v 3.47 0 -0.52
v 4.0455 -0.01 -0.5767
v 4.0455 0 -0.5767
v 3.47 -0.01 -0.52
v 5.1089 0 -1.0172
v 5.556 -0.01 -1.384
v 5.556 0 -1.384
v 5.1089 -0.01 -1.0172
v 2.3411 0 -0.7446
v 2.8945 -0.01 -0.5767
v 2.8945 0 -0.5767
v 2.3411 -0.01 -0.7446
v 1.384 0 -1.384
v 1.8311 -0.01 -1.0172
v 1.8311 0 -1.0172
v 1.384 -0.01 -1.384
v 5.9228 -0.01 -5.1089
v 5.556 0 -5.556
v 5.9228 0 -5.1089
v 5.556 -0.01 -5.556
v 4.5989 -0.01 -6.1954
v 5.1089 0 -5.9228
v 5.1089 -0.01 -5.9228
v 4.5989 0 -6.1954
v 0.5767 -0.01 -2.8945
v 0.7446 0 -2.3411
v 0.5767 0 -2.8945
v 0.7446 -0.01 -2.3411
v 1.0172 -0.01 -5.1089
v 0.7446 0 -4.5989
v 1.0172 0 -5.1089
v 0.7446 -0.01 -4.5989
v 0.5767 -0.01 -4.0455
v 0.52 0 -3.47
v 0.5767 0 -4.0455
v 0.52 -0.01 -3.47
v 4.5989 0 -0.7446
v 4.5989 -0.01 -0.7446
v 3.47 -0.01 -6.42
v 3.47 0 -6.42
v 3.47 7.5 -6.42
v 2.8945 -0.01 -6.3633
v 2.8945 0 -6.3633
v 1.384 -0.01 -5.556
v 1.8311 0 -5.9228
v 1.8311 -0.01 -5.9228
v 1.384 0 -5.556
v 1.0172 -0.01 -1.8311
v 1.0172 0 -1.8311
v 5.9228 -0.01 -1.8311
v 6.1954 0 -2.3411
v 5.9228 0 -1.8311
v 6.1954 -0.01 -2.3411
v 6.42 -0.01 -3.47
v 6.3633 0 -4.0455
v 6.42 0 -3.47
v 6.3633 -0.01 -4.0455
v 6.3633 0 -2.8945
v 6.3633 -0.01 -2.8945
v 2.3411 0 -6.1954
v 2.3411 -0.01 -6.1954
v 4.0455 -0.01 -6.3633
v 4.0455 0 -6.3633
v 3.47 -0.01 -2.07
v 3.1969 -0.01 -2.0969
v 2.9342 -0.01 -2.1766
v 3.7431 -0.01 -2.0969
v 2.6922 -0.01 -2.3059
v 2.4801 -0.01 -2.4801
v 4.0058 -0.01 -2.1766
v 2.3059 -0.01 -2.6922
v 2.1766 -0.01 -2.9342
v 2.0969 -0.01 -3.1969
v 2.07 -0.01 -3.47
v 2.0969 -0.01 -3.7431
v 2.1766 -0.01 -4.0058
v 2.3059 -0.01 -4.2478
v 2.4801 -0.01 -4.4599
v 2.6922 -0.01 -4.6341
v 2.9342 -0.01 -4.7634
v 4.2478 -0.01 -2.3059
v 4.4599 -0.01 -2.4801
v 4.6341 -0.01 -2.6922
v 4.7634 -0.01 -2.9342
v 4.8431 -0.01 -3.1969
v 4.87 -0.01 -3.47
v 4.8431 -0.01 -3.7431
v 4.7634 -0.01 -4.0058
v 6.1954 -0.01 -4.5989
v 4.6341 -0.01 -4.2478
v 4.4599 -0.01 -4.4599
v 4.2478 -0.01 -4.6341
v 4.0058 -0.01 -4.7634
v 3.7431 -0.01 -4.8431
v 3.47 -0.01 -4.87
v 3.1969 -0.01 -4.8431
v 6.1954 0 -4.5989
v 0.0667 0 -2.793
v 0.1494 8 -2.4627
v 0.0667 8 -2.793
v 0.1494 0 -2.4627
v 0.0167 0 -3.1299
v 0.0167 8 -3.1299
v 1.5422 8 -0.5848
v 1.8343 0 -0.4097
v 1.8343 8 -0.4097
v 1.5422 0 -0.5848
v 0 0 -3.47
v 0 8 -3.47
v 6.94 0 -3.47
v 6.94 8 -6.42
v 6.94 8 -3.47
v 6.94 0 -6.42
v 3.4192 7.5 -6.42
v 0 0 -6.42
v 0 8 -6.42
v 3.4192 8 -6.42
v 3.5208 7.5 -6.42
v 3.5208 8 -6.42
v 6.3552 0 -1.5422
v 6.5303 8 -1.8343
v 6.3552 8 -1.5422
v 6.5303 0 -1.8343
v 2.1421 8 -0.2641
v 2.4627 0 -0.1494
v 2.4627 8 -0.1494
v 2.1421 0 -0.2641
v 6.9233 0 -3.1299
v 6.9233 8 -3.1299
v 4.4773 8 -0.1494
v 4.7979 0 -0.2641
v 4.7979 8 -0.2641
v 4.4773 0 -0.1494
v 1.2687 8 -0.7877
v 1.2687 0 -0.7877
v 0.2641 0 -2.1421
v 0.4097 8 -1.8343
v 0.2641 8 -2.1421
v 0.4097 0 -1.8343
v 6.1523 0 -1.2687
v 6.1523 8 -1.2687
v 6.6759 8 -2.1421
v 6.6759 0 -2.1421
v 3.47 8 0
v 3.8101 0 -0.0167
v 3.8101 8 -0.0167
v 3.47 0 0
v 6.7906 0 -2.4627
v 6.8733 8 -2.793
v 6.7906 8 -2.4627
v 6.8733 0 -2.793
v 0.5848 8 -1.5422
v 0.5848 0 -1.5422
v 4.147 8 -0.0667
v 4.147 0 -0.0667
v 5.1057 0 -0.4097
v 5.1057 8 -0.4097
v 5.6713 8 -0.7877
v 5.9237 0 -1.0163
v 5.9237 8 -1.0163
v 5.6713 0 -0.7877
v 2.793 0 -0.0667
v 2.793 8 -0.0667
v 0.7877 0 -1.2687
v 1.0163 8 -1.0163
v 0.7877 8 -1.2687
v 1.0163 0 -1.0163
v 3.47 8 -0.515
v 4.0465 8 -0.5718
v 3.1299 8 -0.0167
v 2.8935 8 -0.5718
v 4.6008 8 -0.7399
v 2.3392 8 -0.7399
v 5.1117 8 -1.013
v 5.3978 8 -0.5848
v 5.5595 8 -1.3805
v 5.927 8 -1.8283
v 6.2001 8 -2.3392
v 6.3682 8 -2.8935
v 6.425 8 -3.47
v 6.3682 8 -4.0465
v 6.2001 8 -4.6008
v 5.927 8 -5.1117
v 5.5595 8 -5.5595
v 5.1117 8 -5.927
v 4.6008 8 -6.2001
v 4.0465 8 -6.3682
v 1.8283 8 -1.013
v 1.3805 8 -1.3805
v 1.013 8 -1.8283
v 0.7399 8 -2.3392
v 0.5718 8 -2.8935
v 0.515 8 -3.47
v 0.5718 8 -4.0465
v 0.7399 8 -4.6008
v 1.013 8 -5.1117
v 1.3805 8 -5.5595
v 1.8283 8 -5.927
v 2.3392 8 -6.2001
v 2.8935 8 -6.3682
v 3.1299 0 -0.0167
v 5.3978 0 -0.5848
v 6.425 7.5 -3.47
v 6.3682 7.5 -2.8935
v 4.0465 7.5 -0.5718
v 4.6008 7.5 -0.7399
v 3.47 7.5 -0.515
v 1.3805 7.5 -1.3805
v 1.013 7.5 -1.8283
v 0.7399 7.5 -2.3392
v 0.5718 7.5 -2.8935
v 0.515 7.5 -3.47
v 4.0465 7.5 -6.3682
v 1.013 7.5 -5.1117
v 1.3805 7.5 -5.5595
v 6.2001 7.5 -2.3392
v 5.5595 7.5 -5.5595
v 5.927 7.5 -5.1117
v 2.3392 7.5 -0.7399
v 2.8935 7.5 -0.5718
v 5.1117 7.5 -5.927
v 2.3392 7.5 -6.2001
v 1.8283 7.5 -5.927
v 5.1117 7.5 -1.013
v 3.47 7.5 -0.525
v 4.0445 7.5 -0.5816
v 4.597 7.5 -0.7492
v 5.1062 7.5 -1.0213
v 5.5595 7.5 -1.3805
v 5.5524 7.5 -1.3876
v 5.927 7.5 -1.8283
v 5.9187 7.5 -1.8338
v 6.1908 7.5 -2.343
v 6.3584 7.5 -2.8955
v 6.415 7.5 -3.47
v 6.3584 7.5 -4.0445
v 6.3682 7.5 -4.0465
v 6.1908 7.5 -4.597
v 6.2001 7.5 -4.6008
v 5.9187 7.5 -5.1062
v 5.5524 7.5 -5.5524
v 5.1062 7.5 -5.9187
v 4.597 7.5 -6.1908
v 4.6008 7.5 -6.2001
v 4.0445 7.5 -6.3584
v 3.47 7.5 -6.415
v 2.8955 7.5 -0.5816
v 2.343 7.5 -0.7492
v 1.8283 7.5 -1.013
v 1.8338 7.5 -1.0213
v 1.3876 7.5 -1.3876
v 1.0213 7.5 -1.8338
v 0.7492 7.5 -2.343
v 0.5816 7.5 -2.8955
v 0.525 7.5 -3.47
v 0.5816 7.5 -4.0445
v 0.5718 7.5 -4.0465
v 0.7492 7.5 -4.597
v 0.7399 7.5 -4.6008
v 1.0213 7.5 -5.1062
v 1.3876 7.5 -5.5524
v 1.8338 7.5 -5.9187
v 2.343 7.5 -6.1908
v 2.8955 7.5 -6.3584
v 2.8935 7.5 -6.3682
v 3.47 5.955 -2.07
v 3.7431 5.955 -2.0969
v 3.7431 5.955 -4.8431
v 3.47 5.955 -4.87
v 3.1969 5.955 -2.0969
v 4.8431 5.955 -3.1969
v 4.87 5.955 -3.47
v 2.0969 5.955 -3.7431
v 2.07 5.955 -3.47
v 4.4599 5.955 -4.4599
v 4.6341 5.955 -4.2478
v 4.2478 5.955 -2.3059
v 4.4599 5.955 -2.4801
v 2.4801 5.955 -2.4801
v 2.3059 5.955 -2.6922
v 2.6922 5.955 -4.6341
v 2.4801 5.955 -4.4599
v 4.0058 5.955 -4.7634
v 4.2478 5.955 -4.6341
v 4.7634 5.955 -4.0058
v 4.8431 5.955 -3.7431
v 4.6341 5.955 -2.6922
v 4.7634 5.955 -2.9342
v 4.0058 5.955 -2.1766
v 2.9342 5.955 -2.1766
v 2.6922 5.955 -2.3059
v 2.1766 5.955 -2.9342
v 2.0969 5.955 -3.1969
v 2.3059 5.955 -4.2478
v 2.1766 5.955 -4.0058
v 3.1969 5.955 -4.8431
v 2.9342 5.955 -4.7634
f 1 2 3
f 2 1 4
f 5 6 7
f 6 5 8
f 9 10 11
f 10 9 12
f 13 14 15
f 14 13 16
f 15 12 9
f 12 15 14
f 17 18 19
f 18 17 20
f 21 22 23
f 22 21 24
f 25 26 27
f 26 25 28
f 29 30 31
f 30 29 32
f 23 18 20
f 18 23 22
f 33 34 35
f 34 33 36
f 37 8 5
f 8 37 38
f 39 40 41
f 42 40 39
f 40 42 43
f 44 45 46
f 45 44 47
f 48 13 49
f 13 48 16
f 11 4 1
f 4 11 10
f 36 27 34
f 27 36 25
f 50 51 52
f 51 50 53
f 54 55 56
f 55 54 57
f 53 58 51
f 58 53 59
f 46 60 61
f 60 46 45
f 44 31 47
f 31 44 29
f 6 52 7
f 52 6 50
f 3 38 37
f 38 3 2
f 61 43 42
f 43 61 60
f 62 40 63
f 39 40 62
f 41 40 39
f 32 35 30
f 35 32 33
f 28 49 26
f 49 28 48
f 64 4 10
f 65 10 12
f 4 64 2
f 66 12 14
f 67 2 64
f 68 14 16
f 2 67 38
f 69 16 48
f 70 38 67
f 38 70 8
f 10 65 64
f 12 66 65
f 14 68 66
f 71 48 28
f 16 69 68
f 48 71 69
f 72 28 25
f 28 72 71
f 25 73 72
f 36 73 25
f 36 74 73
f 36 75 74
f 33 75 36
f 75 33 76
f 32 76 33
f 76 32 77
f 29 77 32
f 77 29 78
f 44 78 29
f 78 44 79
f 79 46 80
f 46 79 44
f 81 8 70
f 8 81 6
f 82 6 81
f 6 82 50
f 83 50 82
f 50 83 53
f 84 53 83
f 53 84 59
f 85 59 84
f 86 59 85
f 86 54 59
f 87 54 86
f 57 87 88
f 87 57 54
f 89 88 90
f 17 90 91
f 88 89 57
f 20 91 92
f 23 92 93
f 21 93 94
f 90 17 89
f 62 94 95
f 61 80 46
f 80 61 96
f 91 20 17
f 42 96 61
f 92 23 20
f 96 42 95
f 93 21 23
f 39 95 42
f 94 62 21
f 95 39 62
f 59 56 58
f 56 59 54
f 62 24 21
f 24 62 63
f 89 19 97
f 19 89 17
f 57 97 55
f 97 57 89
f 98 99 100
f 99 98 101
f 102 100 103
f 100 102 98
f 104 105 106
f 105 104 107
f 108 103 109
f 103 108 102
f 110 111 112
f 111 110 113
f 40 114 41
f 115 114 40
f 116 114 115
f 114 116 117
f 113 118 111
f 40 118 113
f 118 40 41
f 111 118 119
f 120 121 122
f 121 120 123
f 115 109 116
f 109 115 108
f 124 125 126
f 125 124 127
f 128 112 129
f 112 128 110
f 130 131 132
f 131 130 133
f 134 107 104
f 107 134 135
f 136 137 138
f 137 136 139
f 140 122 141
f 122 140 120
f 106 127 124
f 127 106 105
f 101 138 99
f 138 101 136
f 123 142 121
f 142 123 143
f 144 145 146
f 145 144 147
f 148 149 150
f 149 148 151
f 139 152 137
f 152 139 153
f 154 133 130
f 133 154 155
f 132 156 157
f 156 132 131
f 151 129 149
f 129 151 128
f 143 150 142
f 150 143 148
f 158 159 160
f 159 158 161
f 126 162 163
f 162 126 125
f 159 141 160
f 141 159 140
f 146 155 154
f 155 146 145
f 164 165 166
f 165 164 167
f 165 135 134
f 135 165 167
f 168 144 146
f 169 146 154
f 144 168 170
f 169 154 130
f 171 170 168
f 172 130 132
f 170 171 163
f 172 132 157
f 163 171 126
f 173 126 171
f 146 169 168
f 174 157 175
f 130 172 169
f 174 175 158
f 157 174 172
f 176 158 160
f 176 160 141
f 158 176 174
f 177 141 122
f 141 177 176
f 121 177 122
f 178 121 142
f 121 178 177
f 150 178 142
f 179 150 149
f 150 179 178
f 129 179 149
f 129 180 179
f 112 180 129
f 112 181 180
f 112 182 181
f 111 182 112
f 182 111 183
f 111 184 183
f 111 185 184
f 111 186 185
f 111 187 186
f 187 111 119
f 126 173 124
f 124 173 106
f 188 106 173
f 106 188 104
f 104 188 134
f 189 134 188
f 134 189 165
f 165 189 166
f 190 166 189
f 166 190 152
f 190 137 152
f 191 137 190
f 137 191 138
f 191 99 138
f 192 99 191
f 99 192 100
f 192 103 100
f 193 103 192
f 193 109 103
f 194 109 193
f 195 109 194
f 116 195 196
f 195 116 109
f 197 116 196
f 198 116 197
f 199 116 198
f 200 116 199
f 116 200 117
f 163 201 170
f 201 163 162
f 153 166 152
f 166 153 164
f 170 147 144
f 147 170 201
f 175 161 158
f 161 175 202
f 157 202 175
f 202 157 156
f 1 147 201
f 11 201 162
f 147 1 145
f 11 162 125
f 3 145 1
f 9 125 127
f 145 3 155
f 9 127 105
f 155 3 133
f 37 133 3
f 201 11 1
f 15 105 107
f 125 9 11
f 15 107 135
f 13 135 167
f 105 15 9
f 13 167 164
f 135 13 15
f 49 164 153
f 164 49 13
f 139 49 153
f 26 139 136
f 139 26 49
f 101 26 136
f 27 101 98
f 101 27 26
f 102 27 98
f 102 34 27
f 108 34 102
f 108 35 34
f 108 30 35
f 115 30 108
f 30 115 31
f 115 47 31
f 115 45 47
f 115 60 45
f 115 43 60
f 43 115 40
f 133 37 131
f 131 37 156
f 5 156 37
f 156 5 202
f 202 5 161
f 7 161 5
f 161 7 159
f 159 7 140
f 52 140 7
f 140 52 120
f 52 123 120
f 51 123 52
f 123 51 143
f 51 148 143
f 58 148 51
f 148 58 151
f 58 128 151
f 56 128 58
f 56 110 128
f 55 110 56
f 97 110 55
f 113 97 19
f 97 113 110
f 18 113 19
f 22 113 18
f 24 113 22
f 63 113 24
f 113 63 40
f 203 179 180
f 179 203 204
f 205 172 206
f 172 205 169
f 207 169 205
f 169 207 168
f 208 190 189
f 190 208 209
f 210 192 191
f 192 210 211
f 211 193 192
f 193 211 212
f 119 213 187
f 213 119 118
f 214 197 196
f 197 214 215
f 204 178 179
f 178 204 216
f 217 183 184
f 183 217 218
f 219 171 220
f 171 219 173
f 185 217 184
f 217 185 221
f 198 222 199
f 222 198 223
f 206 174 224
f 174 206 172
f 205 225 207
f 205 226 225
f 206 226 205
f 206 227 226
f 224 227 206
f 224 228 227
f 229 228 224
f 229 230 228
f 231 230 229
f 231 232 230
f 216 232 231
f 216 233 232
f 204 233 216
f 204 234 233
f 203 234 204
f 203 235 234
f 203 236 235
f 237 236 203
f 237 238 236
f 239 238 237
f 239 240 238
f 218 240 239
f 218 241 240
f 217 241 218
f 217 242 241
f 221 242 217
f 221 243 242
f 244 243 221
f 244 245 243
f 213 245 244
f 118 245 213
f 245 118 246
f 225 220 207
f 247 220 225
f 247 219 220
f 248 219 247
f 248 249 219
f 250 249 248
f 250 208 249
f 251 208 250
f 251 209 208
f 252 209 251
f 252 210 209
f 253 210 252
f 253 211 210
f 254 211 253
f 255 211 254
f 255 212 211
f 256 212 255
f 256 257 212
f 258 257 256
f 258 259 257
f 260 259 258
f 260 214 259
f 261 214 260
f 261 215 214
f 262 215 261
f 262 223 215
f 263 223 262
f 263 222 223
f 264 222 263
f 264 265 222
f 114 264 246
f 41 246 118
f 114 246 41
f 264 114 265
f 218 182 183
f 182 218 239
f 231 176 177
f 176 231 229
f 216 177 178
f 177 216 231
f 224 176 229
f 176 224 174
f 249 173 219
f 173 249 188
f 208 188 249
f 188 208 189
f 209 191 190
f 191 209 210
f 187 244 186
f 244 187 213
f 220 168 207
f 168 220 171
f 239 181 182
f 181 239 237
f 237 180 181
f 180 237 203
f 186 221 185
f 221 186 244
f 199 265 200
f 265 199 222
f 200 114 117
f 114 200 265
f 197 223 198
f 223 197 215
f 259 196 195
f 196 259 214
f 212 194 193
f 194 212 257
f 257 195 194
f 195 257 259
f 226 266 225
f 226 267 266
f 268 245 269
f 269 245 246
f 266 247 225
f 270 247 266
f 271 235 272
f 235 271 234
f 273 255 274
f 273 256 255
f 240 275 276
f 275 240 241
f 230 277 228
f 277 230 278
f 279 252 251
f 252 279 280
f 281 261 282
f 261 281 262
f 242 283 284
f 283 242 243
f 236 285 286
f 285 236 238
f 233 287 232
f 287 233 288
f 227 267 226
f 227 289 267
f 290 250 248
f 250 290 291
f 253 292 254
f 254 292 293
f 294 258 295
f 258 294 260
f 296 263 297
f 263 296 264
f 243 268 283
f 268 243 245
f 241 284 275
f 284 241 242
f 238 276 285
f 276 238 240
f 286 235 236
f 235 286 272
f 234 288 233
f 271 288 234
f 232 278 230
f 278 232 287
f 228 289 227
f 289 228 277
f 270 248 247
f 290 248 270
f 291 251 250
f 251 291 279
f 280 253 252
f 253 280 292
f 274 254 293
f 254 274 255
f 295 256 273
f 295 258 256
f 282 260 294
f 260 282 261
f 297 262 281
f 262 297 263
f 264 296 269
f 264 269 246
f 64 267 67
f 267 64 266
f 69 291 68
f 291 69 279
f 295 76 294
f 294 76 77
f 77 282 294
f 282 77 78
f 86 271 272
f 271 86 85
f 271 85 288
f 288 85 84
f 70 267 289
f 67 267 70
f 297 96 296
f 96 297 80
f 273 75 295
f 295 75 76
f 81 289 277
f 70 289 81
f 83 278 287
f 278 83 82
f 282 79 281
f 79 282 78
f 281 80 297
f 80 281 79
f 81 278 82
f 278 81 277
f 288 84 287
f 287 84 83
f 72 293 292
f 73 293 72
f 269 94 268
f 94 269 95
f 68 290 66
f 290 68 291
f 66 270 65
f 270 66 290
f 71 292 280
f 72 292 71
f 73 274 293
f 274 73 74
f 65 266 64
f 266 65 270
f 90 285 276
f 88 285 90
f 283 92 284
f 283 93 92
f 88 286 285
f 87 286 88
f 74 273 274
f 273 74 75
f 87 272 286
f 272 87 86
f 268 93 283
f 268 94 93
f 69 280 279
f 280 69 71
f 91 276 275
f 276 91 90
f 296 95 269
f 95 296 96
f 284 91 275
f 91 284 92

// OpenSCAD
// Start: lazy_union
default_5_default_5();
// End: lazy_union

// Modules.

// 'PartMaterial undef-default - default 5.0'
module default_5_default_5() {
  // 'None : _combine_solids_and_holes'
  union() {
    // '_combine_solids_and_holes'
    difference() {
      // 'default : _combine_solids_and_holes'
      union() {
        // 'tab : _combine_solids_and_holes'
        union() {
          // 'box_cylinder'
          multmatrix(m=[[-1.0, 0.0, 0.0, 3.4699999999999998], [0.0, 0.0, 1.0, 0.0], [0.0, 1.0, 0.0, -6.42], [0.0, 0.0, 0.0, 1.0]]) {
            // 'box_cylinder : _combine_solids_and_holes'
            union() {
              // 'box_cylinder'
              linear_extrude(height=8.0, twist=0.0, slices=4, scale=[1.0, 1.0], $fn=32) {
                polygon(points=[[0.0, 0.0], [-3.4699999999999998, 0.0], [-3.4699999999999998, 2.95], [-3.4532910015525227, 3.290119476943576], [-3.4033249229992095, 3.6269634173959657], [-3.3205829649907646, 3.957287830072984], [-3.205861977814165, 4.277911510306861], [-3.0602667872887914, 4.585746676786212], [-2.8851995546898324, 4.877828708578019], [-2.6823462731686973, 5.1513446960478495], [-2.4536605307173196, 5.403660530717319], [-2.2013446960478493, 5.6323462731686975], [-1.9278287085780186, 5.835199554689832], [-1.6357466767862119, 6.010266787288792], [-1.3279115103068613, 6.1558619778141646], [-1.0072878300729837, 6.270582964990764], [-0.6769634173959648, 6.353324922999209], [-0.3401194769435754, 6.403291001552523], [2.1247621965206577e-16, 6.42], [0.34011947694357586, 6.403291001552523], [0.6769634173959652, 6.353324922999209], [1.0072878300729842, 6.270582964990764], [1.3279115103068617, 6.1558619778141646], [1.6357466767862123, 6.010266787288791], [1.927828708578019, 5.835199554689832], [2.2013446960478498, 5.632346273168697], [2.45366053071732, 5.403660530717319], [2.6823462731686973, 5.151344696047849], [2.8851995546898324, 4.8778287085780185], [3.0602667872887914, 4.585746676786211], [3.205861977814165, 4.277911510306861], [3.3205829649907646, 3.9572878300729837], [3.4033249229992095, 3.6269634173959657], [3.453291001552523, 3.2901194769435755], [3.4699999999999998, 2.9499999999999997], [3.4699999999999998, 0.0]]);
              }
            }
          }
        }
        // 'screw'
        multmatrix(m=[[-6.123233995736766e-17, 1.0, 0.0, 3.4699999999999998], [0.0, 0.0, 1.0, 8.0], [1.0, 6.123233995736766e-17, 0.0, -3.4699999999999998], [0.0, 0.0, 0.0, 1.0]]) {
          // 'thru'
          multmatrix(m=[[1.0, 0.0, 0.0, 0.0], [0.0, -1.0, 0.0, 0.0], [0.0, 0.0, -1.0, -4.0], [0.0, 0.0, 0.0, 1.0]]) {
            // 'outer'
            multmatrix(m=[[1.0, 0.0, 0.0, 0.0], [-0.0, -1.0, -0.0, -0.0], [-0.0, -0.0, -1.0, 4.01], [0.0, 0.0, 0.0, 1.0]]) {
              // 'outer : _combine_solids_and_holes'
              union() {
                // 'pie : _combine_solids_and_holes'
                union() {
                  // 'pie'
                  polyhedron(points=[[0.0, 0.0, 0.0], [0.0, 0.0, 8.02], [2.95, 0.0, 8.02], [2.95, 0.0, 0.0], [0.0, 0.0, 0.0], [0.0, 0.0, 8.02], [2.89331657718953, 0.5755164499475783, 8.02], [2.89331657718953, 0.5755164499475783, 0.0], [0.0, 0.0, 0.0], [0.0, 0.0, 8.02], [2.725444620908296, 1.128916125477015, 8.02], [2.725444620908296, 1.128916125477015, 0.0], [0.0, 0.0, 0.0], [0.0, 0.0, 8.02], [2.4528353562925087, 1.6389321874078264, 8.02], [2.4528353562925087, 1.6389321874078264, 0.0], [0.0, 0.0, 0.0], [0.0, 0.0, 8.02], [2.0859650045003155, 2.0859650045003155, 8.02], [2.0859650045003155, 2.0859650045003155, 0.0], [0.0, 0.0, 0.0], [0.0, 0.0, 8.02], [1.6389321874078269, 2.4528353562925087, 8.02], [1.6389321874078269, 2.4528353562925087, 0.0], [0.0, 0.0, 0.0], [0.0, 0.0, 8.02], [1.128916125477015, 2.725444620908296, 8.02], [1.128916125477015, 2.725444620908296, 0.0], [0.0, 0.0, 0.0], [0.0, 0.0, 8.02], [0.5755164499475786, 2.89331657718953, 8.02], [0.5755164499475786, 2.89331657718953, 0.0], [0.0, 0.0, 0.0], [0.0, 0.0, 8.02], [0.0, 2.95, 8.02], [0.0, 2.95, 0.0], [0.0, 0.0, 0.0], [0.0, 0.0, 8.02], [-0.5755164499475782, 2.89331657718953, 8.02], [-0.5755164499475782, 2.89331657718953, 0.0], [0.0, 0.0, 0.0], [0.0, 0.0, 8.02], [-1.1289161254770148, 2.725444620908296, 8.02], [-1.1289161254770148, 2.725444620908296, 0.0], [0.0, 0.0, 0.0], [0.0, 0.0, 8.02], [-1.6389321874078258, 2.4528353562925087, 8.02], [-1.6389321874078258, 2.4528353562925087, 0.0], [0.0, 0.0, 0.0], [0.0, 0.0, 8.02], [-2.085965004500315, 2.0859650045003155, 8.02], [-2.085965004500315, 2.0859650045003155, 0.0], [0.0, 0.0, 0.0], [0.0, 0.0, 8.02], [-2.4528353562925087, 1.6389321874078264, 8.02], [-2.4528353562925087, 1.6389321874078264, 0.0], [0.0, 0.0, 0.0], [0.0, 0.0, 8.02], [-2.725444620908296, 1.1289161254770153, 8.02], [-2.725444620908296, 1.1289161254770153, 0.0], [0.0, 0.0, 0.0], [0.0, 0.0, 8.02], [-2.89331657718953, 0.5755164499475794, 8.02], [-2.89331657718953, 0.5755164499475794, 0.0], [0.0, 0.0, 0.0], [0.0, 0.0, 8.02], [-2.95, 0.0, 8.02], [-2.95, 0.0, 0.0], [0.0, 0.0, 0.0], [0.0, 0.0, 8.02], [-2.89331657718953, -0.5755164499475787, 8.02], [-2.89331657718953, -0.5755164499475787, 0.0], [0.0, 0.0, 0.0], [0.0, 0.0, 8.02], [-2.7254446209082963, -1.1289161254770146, 8.02], [-2.7254446209082963, -1.1289161254770146, 0.0], [0.0, 0.0, 0.0], [0.0, 0.0, 8.02], [-2.452835356292509, -1.6389321874078258, 8.02], [-2.452835356292509, -1.6389321874078258, 0.0], [0.0, 0.0, 0.0], [0.0, 0.0, 8.02], [-2.085965004500316, -2.085965004500315, 8.02], [-2.085965004500316, -2.085965004500315, 0.0], [0.0, 0.0, 0.0], [0.0, 0.0, 8.02], [-1.6389321874078264, -2.4528353562925087, 8.02], [-1.6389321874078264, -2.4528353562925087, 0.0], [0.0, 0.0, 0.0], [0.0, 0.0, 8.02], [-1.1289161254770166, -2.7254446209082954, 8.02], [-1.1289161254770166, -2.7254446209082954, 0.0], [0.0, 0.0, 0.0], [0.0, 0.0, 8.02], [-0.5755164499475796, -2.8933165771895295, 8.02], [-0.5755164499475796, -2.8933165771895295, 0.0], [0.0, 0.0, 0.0], [0.0, 0.0, 8.02], [0.0, -2.95, 8.02], [0.0, -2.95, 0.0], [0.0, 0.0, 0.0], [0.0, 0.0, 8.02], [0.5755164499475786, -2.89331657718953, 8.02], [0.5755164499475786, -2.89331657718953, 0.0], [0.0, 0.0, 0.0], [0.0, 0.0, 8.02], [1.1289161254770155, -2.725444620908296, 8.02], [1.1289161254770155, -2.725444620908296, 0.0], [0.0, 0.0, 0.0], [0.0, 0.0, 8.02], [1.6389321874078255, -2.452835356292509, 8.02], [1.6389321874078255, -2.452835356292509, 0.0], [0.0, 0.0, 0.0], [0.0, 0.0, 8.02], [2.0859650045003146, -2.085965004500316, 8.02], [2.0859650045003146, -2.085965004500316, 0.0], [0.0, 0.0, 0.0], [0.0, 0.0, 8.02], [2.4528353562925087, -1.6389321874078264, 8.02], [2.4528353562925087, -1.6389321874078264, 0.0], [0.0, 0.0, 0.0], [0.0, 0.0, 8.02], [2.7254446209082954, -1.1289161254770168, 8.02], [2.7254446209082954, -1.1289161254770168, 0.0], [0.0, 0.0, 0.0], [0.0, 0.0, 8.02], [2.8933165771895295, -0.5755164499475798, 8.02], [2.8933165771895295, -0.5755164499475798, 0.0], [0.0, 0.0, 0.0], [0.0, 0.0, 8.02], [2.95, 0.0, 8.02], [2.95, 0.0, 0.0]], faces=[[0, 4, 5, 1], [1, 5, 6, 2], [2, 6, 7, 3], [3, 7, 4, 0], [4, 8, 9, 5], [5, 9, 10, 6], [6, 10, 11, 7], [7, 11, 8, 4], [8, 12, 13, 9], [9, 13, 14, 10], [10, 14, 15, 11], [11, 15, 12, 8], [12, 16, 17, 13], [13, 17, 18, 14], [14, 18, 19, 15], [15, 19, 16, 12], [16, 20, 21, 17], [17, 21, 22, 18], [18, 22, 23, 19], [19, 23, 20, 16], [20, 24, 25, 21], [21, 25, 26, 22], [22, 26, 27, 23], [23, 27, 24, 20], [24, 28, 29, 25], [25, 29, 30, 26], [26, 30, 31, 27], [27, 31, 28, 24], [28, 32, 33, 29], [29, 33, 34, 30], [30, 34, 35, 31], [31, 35, 32, 28], [32, 36, 37, 33], [33, 37, 38, 34], [34, 38, 39, 35], [35, 39, 36, 32], [36, 40, 41, 37], [37, 41, 42, 38], [38, 42, 43, 39], [39, 43, 40, 36], [40, 44, 45, 41], [41, 45, 46, 42], [42, 46, 47, 43], [43, 47, 44, 40], [44, 48, 49, 45], [45, 49, 50, 46], [46, 50, 51, 47], [47, 51, 48, 44], [48, 52, 53, 49], [49, 53, 54, 50], [50, 54, 55, 51], [51, 55, 52, 48], [52, 56, 57, 53], [53, 57, 58, 54], [54, 58, 59, 55], [55, 59, 56, 52], [56, 60, 61, 57], [57, 61, 62, 58], [58, 62, 63, 59], [59, 63, 60, 56], [60, 64, 65, 61], [61, 65, 66, 62], [62, 66, 67, 63], [63, 67, 64, 60], [64, 68, 69, 65], [65, 69, 70, 66], [66, 70, 71, 67], [67, 71, 68, 64], [68, 72, 73, 69], [69, 73, 74, 70], [70, 74, 75, 71], [71, 75, 72, 68], [72, 76, 77, 73], [73, 77, 78, 74], [74, 78, 79, 75], [75, 79, 76, 72], [76, 80, 81, 77], [77, 81, 82, 78], [78, 82, 83, 79], [79, 83, 80, 76], [80, 84, 85, 81], [81, 85, 86, 82], [82, 86, 87, 83], [83, 87, 84, 80], [84, 88, 89, 85], [85, 89, 90, 86], [86, 90, 91, 87], [87, 91, 88, 84], [88, 92, 93, 89], [89, 93, 94, 90], [90, 94, 95, 91], [91, 95, 92, 88], [92, 96, 97, 93], [93, 97, 98, 94], [94, 98, 99, 95], [95, 99, 96, 92], [96, 100, 101, 97], [97, 101, 102, 98], [98, 102, 103, 99], [99, 103, 100, 96], [100, 104, 105, 101], [101, 105, 106, 102], [102, 106, 107, 103], [103, 107, 104, 100], [104, 108, 109, 105], [105, 109, 110, 106], [106, 110, 111, 107], [107, 111, 108, 104], [108, 112, 113, 109], [109, 113, 114, 110], [110, 114, 115, 111], [111, 115, 112, 108], [112, 116, 117, 113], [113, 117, 118, 114], [114, 118, 119, 115], [115, 119, 116, 112], [116, 120, 121, 117], [117, 121, 122, 118], [118, 122, 123, 119], [119, 123, 120, 116], [120, 124, 125, 121], [121, 125, 126, 122], [122, 126, 127, 123], [123, 127, 124, 120], [124, 128, 129, 125], [125, 129, 130, 126], [126, 130, 131, 127], [127, 131, 128, 124], [128, 0, 1, 129], [129, 1, 2, 130], [130, 2, 3, 131], [131, 3, 0, 128]], convexity=10);
                }
              }
            }
          }
          // 'tap'
          multmatrix(m=[[1.0, 0.0, 0.0, 0.0], [0.0, -1.0, 0.0, 0.0], [0.0, 0.0, -1.0, -7.98], [0.0, 0.0, 0.0, 1.0]]) {
            // 'outer'
            multmatrix(m=[[1.0, 0.0, 0.0, 0.0], [-0.0, -1.0, -0.0, -0.0], [-0.0, -0.0, -1.0, 0.01], [0.0, 0.0, 0.0, 1.0]]) {
              // 'outer : _combine_solids_and_holes'
              union() {
                // 'pie : _combine_solids_and_holes'
                union() {
                  // 'pie'
                  polyhedron(points=[[0.0, 0.0, 0.0], [0.0, 0.0, 0.02], [2.95, 0.0, 0.02], [2.95, 0.0, 0.0], [0.0, 0.0, 0.0], [0.0, 0.0, 0.02], [2.89331657718953, 0.5755164499475783, 0.02], [2.89331657718953, 0.5755164499475783, 0.0], [0.0, 0.0, 0.0], [0.0, 0.0, 0.02], [2.725444620908296, 1.128916125477015, 0.02], [2.725444620908296, 1.128916125477015, 0.0], [0.0, 0.0, 0.0], [0.0, 0.0, 0.02], [2.4528353562925087, 1.6389321874078264, 0.02], [2.4528353562925087, 1.6389321874078264, 0.0], [0.0, 0.0, 0.0], [0.0, 0.0, 0.02], [2.0859650045003155, 2.0859650045003155, 0.02], [2.0859650045003155, 2.0859650045003155, 0.0], [0.0, 0.0, 0.0], [0.0, 0.0, 0.02], [1.6389321874078269, 2.4528353562925087, 0.02], [1.6389321874078269, 2.4528353562925087, 0.0], [0.0, 0.0, 0.0], [0.0, 0.0, 0.02], [1.128916125477015, 2.725444620908296, 0.02], [1.128916125477015, 2.725444620908296, 0.0], [0.0, 0.0, 0.0], [0.0, 0.0, 0.02], [0.5755164499475786, 2.89331657718953, 0.02], [0.5755164499475786, 2.89331657718953, 0.0], [0.0, 0.0, 0.0], [0.0, 0.0, 0.02], [0.0, 2.95, 0.02], [0.0, 2.95, 0.0], [0.0, 0.0, 0.0], [0.0, 0.0, 0.02], [-0.5755164499475782, 2.89331657718953, 0.02], [-0.5755164499475782, 2.89331657718953, 0.0], [0.0, 0.0, 0.0], [0.0, 0.0, 0.02], [-1.1289161254770148, 2.725444620908296, 0.02], [-1.1289161254770148, 2.725444620908296, 0.0], [0.0, 0.0, 0.0], [0.0, 0.0, 0.02], [-1.6389321874078258, 2.4528353562925087, 0.02], [-1.6389321874078258, 2.4528353562925087, 0.0], [0.0, 0.0, 0.0], [0.0, 0.0, 0.02], [-2.085965004500315, 2.0859650045003155, 0.02], [-2.085965004500315, 2.0859650045003155, 0.0], [0.0, 0.0, 0.0], [0.0, 0.0, 0.02], [-2.4528353562925087, 1.6389321874078264, 0.02], [-2.4528353562925087, 1.6389321874078264, 0.0], [0.0, 0.0, 0.0], [0.0, 0.0, 0.02], [-2.725444620908296, 1.1289161254770153, 0.02], [-2.725444620908296, 1.1289161254770153, 0.0], [0.0, 0.0, 0.0], [0.0, 0.0, 0.02], [-2.89331657718953, 0.5755164499475794, 0.02], [-2.89331657718953, 0.5755164499475794, 0.0], [0.0, 0.0, 0.0], [0.0, 0.0, 0.02], [-2.95, 0.0, 0.02], [-2.95, 0.0, 0.0], [0.0, 0.0, 0.0], [0.0, 0.0, 0.02], [-2.89331657718953, -0.5755164499475787, 0.02], [-2.89331657718953, -0.5755164499475787, 0.0], [0.0, 0.0, 0.0], [0.0, 0.0, 0.02], [-2.7254446209082963, -1.1289161254770146, 0.02], [-2.7254446209082963, -1.1289161254770146, 0.0], [0.0, 0.0, 0.0], [0.0, 0.0, 0.02], [-2.452835356292509, -1.6389321874078258, 0.02], [-2.452835356292509, -1.6389321874078258, 0.0], [0.0, 0.0, 0.0], [0.0, 0.0, 0.02], [-2.085965004500316, -2.085965004500315, 0.02], [-2.085965004500316, -2.085965004500315, 0.0], [0.0, 0.0, 0.0], [0.0, 0.0, 0.02], [-1.6389321874078264, -2.4528353562925087, 0.02], [-1.6389321874078264, -2.4528353562925087, 0.0], [0.0, 0.0, 0.0], [0.0, 0.0, 0.02], [-1.1289161254770166, -2.7254446209082954, 0.02], [-1.1289161254770166, -2.7254446209082954, 0.0], [0.0, 0.0, 0.0], [0.0, 0.0, 0.02], [-0.5755164499475796, -2.8933165771895295, 0.02], [-0.5755164499475796, -2.8933165771895295, 0.0], [0.0, 0.0, 0.0], [0.0, 0.0, 0.02], [0.0, -2.95, 0.02], [0.0, -2.95, 0.0], [0.0, 0.0, 0.0], [0.0, 0.0, 0.02], [0.5755164499475786, -2.89331657718953, 0.02], [0.5755164499475786, -2.89331657718953, 0.0], [0.0, 0.0, 0.0], [0.0, 0.0, 0.02], [1.1289161254770155, -2.725444620908296, 0.02], [1.1289161254770155, -2.725444620908296, 0.0], [0.0, 0.0, 0.0], [0.0, 0.0, 0.02], [1.6389321874078255, -2.452835356292509, 0.02], [1.6389321874078255, -2.452835356292509, 0.0], [0.0, 0.0, 0.0], [0.0, 0.0, 0.02], [2.0859650045003146, -2.085965004500316, 0.02], [2.0859650045003146, -2.085965004500316, 0.0], [0.0, 0.0, 0.0], [0.0, 0.0, 0.02], [2.4528353562925087, -1.6389321874078264, 0.02], [2.4528353562925087, -1.6389321874078264, 0.0], [0.0, 0.0, 0.0], [0.0, 0.0, 0.02], [2.7254446209082954, -1.1289161254770168, 0.02], [2.7254446209082954, -1.1289161254770168, 0.0], [0.0, 0.0, 0.0], [0.0, 0.0, 0.02], [2.8933165771895295, -0.5755164499475798, 0.02], [2.8933165771895295, -0.5755164499475798, 0.0], [0.0, 0.0, 0.0], [0.0, 0.0, 0.02], [2.95, 0.0, 0.02], [2.95, 0.0, 0.0]], faces=[[0, 4, 5, 1], [1, 5, 6, 2], [2, 6, 7, 3], [3, 7, 4, 0], [4, 8, 9, 5], [5, 9, 10, 6], [6, 10, 11, 7], [7, 11, 8, 4], [8, 12, 13, 9], [9, 13, 14, 10], [10, 14, 15, 11], [11, 15, 12, 8], [12, 16, 17, 13], [13, 17, 18, 14], [14, 18, 19, 15], [15, 19, 16, 12], [16, 20, 21, 17], [17, 21, 22, 18], [18, 22, 23, 19], [19, 23, 20, 16], [20, 24, 25, 21], [21, 25, 26, 22], [22, 26, 27, 23], [23, 27, 24, 20], [24, 28, 29, 25], [25, 29, 30, 26], [26, 30, 31, 27], [27, 31, 28, 24], [28, 32, 33, 29], [29, 33, 34, 30], [30, 34, 35, 31], [31, 35, 32, 28], [32, 36, 37, 33], [33, 37, 38, 34], [34, 38, 39, 35], [35, 39, 36, 32], [36, 40, 41, 37], [37, 41, 42, 38], [38, 42, 43, 39], [39, 43, 40, 36], [40, 44, 45, 41], [41, 45, 46, 42], [42, 46, 47, 43], [43, 47, 44, 40], [44, 48, 49, 45], [45, 49, 50, 46], [46, 50, 51, 47], [47, 51, 48, 44], [48, 52, 53, 49], [49, 53, 54, 50], [50, 54, 55, 51], [51, 55, 52, 48], [52, 56, 57, 53], [53, 57, 58, 54], [54, 58, 59, 55], [55, 59, 56, 52], [56, 60, 61, 57], [57, 61, 62, 58], [58, 62, 63, 59], [59, 63, 60, 56], [60, 64, 65, 61], [61, 65, 66, 62], [62, 66, 67, 63], [63, 67, 64, 60], [64, 68, 69, 65], [65, 69, 70, 66], [66, 70, 71, 67], [67, 71, 68, 64], [68, 72, 73, 69], [69, 73, 74, 70], [70, 74, 75, 71], [71, 75, 72, 68], [72, 76, 77, 73], [73, 77, 78, 74], [74, 78, 79, 75], [75, 79, 76, 72], [76, 80, 81, 77], [77, 81, 82, 78], [78, 82, 83, 79], [79, 83, 80, 76], [80, 84, 85, 81], [81, 85, 86, 82], [82, 86, 87, 83], [83, 87, 84, 80], [84, 88, 89, 85], [85, 89, 90, 86], [86, 90, 91, 87], [87, 91, 88, 84], [88, 92, 93, 89], [89, 93, 94, 90], [90, 94, 95, 91], [91, 95, 92, 88], [92, 96, 97, 93], [93, 97, 98, 94], [94, 98, 99, 95], [95, 99, 96, 92], [96, 100, 101, 97], [97, 101, 102, 98], [98, 102, 103, 99], [99, 103, 100, 96], [100, 104, 105, 101], [101, 105, 106, 102], [102, 106, 107, 103], [103, 107, 104, 100], [104, 108, 109, 105], [105, 109, 110, 106], [106, 110, 111, 107], [107, 111, 108, 104], [108, 112, 113, 109], [109, 113, 114, 110], [110, 114, 115, 111], [111, 115, 112, 108], [112, 116, 117, 113], [113, 117, 118, 114], [114, 118, 119, 115], [115, 119, 116, 112], [116, 120, 121, 117], [117, 121, 122, 118], [118, 122, 123, 119], [119, 123, 120, 116], [120, 124, 125, 121], [121, 125, 126, 122], [122, 126, 127, 123], [123, 127, 124, 120], [124, 128, 129, 125], [125, 129, 130, 126], [126, 130, 131, 127], [127, 131, 128, 124], [128, 0, 1, 129], [129, 1, 2, 130], [130, 2, 3, 131], [131, 3, 0, 128]], convexity=10);
                }
              }
            }
          }
        }
      }
      // 'screw'
      multmatrix(m=[[-6.123233995736766e-17, 1.0, 0.0, 3.4699999999999998], [0.0, 0.0, 1.0, 8.0], [1.0, 6.123233995736766e-17, 0.0, -3.4699999999999998], [0.0, 0.0, 0.0, 1.0]]) {
        // 'thru'
        multmatrix(m=[[1.0, 0.0, 0.0, 0.0], [0.0, -1.0, 0.0, 0.0], [0.0, 0.0, -1.0, -4.0], [0.0, 0.0, 0.0, 1.0]]) {
          // 'thru'
          multmatrix(m=[[1.0, 0.0, 0.0, 0.0], [-0.0, -1.0, -0.0, -0.0], [-0.0, -0.0, -1.0, 4.015], [0.0, 0.0, 0.0, 1.0]]) {
            // 'inner : _combine_solids_and_holes'
            union() {
              // 'pie : _combine_solids_and_holes'
              union() {
                // 'pie'
                polyhedron(points=[[0.0, 0.0, 0.0], [0.0, 0.0, 8.03], [1.4, 0.0, 8.03], [1.4, 0.0, 0.0], [0.0, 0.0, 0.0], [0.0, 0.0, 8.03], [1.3730993925645225, 0.2731264508225795, 8.03], [1.3730993925645225, 0.2731264508225795, 0.0], [0.0, 0.0, 0.0], [0.0, 0.0, 8.03], [1.2934313455158013, 0.5357568053111257, 8.03], [1.2934313455158013, 0.5357568053111257, 0.0], [0.0, 0.0, 0.0], [0.0, 0.0, 8.03], [1.1640574572235634, 0.777798326227443, 8.03], [1.1640574572235634, 0.777798326227443, 0.0], [0.0, 0.0, 0.0], [0.0, 0.0, 8.03], [0.9899494936611666, 0.9899494936611666, 8.03], [0.9899494936611666, 0.9899494936611666, 0.0], [0.0, 0.0, 0.0], [0.0, 0.0, 8.03], [0.7777983262274432, 1.1640574572235634, 8.03], [0.7777983262274432, 1.1640574572235634, 0.0], [0.0, 0.0, 0.0], [0.0, 0.0, 8.03], [0.5357568053111257, 1.2934313455158013, 8.03], [0.5357568053111257, 1.2934313455158013, 0.0], [0.0, 0.0, 0.0], [0.0, 0.0, 8.03], [0.27312645082257964, 1.3730993925645225, 8.03], [0.27312645082257964, 1.3730993925645225, 0.0], [0.0, 0.0, 0.0], [0.0, 0.0, 8.03], [0.0, 1.4, 8.03], [0.0, 1.4, 0.0], [0.0, 0.0, 0.0], [0.0, 0.0, 8.03], [-0.27312645082257947, 1.3730993925645225, 8.03], [-0.27312645082257947, 1.3730993925645225, 0.0], [0.0, 0.0, 0.0], [0.0, 0.0, 8.03], [-0.5357568053111256, 1.2934313455158013, 8.03], [-0.5357568053111256, 1.2934313455158013, 0.0], [0.0, 0.0, 0.0], [0.0, 0.0, 8.03], [-0.7777983262274427, 1.1640574572235634, 8.03], [-0.7777983262274427, 1.1640574572235634, 0.0], [0.0, 0.0, 0.0], [0.0, 0.0, 8.03], [-0.9899494936611664, 0.9899494936611666, 8.03], [-0.9899494936611664, 0.9899494936611666, 0.0], [0.0, 0.0, 0.0], [0.0, 0.0, 8.03], [-1.1640574572235634, 0.777798326227443, 8.03], [-1.1640574572235634, 0.777798326227443, 0.0], [0.0, 0.0, 0.0], [0.0, 0.0, 8.03], [-1.2934313455158013, 0.5357568053111258, 8.03], [-1.2934313455158013, 0.5357568053111258, 0.0], [0.0, 0.0, 0.0], [0.0, 0.0, 8.03], [-1.3730993925645225, 0.27312645082258, 8.03], [-1.3730993925645225, 0.27312645082258, 0.0], [0.0, 0.0, 0.0], [0.0, 0.0, 8.03], [-1.4, 0.0, 8.03], [-1.4, 0.0, 0.0], [0.0, 0.0, 0.0], [0.0, 0.0, 8.03], [-1.3730993925645225, -0.2731264508225797, 8.03], [-1.3730993925645225, -0.2731264508225797, 0.0], [0.0, 0.0, 0.0], [0.0, 0.0, 8.03], [-1.2934313455158015, -0.5357568053111255, 8.03], [-1.2934313455158015, -0.5357568053111255, 0.0], [0.0, 0.0, 0.0], [0.0, 0.0, 8.03], [-1.1640574572235636, -0.7777983262274427, 8.03], [-1.1640574572235636, -0.7777983262274427, 0.0], [0.0, 0.0, 0.0], [0.0, 0.0, 8.03], [-0.9899494936611667, -0.9899494936611664, 8.03], [-0.9899494936611667, -0.9899494936611664, 0.0], [0.0, 0.0, 0.0], [0.0, 0.0, 8.03], [-0.777798326227443, -1.1640574572235634, 8.03], [-0.777798326227443, -1.1640574572235634, 0.0], [0.0, 0.0, 0.0], [0.0, 0.0, 8.03], [-0.5357568053111265, -1.293431345515801, 8.03], [-0.5357568053111265, -1.293431345515801, 0.0], [0.0, 0.0, 0.0], [0.0, 0.0, 8.03], [-0.27312645082258014, -1.3730993925645223, 8.03], [-0.27312645082258014, -1.3730993925645223, 0.0], [0.0, 0.0, 0.0], [0.0, 0.0, 8.03], [0.0, -1.4, 8.03], [0.0, -1.4, 0.0], [0.0, 0.0, 0.0], [0.0, 0.0, 8.03], [0.2731264508225796, -1.3730993925645225, 8.03], [0.2731264508225796, -1.3730993925645225, 0.0], [0.0, 0.0, 0.0], [0.0, 0.0, 8.03], [0.535756805311126, -1.2934313455158013, 8.03], [0.535756805311126, -1.2934313455158013, 0.0], [0.0, 0.0, 0.0], [0.0, 0.0, 8.03], [0.7777983262274425, -1.1640574572235636, 8.03], [0.7777983262274425, -1.1640574572235636, 0.0], [0.0, 0.0, 0.0], [0.0, 0.0, 8.03], [0.9899494936611662, -0.9899494936611667, 8.03], [0.9899494936611662, -0.9899494936611667, 0.0], [0.0, 0.0, 0.0], [0.0, 0.0, 8.03], [1.1640574572235634, -0.777798326227443, 8.03], [1.1640574572235634, -0.777798326227443, 0.0], [0.0, 0.0, 0.0], [0.0, 0.0, 8.03], [1.293431345515801, -0.5357568053111265, 8.03], [1.293431345515801, -0.5357568053111265, 0.0], [0.0, 0.0, 0.0], [0.0, 0.0, 8.03], [1.3730993925645223, -0.2731264508225802, 8.03], [1.3730993925645223, -0.2731264508225802, 0.0], [0.0, 0.0, 0.0], [0.0, 0.0, 8.03], [1.4, 0.0, 8.03], [1.4, 0.0, 0.0]], faces=[[0, 4, 5, 1], [1, 5, 6, 2], [2, 6, 7, 3], [3, 7, 4, 0], [4, 8, 9, 5], [5, 9, 10, 6], [6, 10, 11, 7], [7, 11, 8, 4], [8, 12, 13, 9], [9, 13, 14, 10], [10, 14, 15, 11], [11, 15, 12, 8], [12, 16, 17, 13], [13, 17, 18, 14], [14, 18, 19, 15], [15, 19, 16, 12], [16, 20, 21, 17], [17, 21, 22, 18], [18, 22, 23, 19], [19, 23, 20, 16], [20, 24, 25, 21], [21, 25, 26, 22], [22, 26, 27, 23], [23, 27, 24, 20], [24, 28, 29, 25], [25, 29, 30, 26], [26, 30, 31, 27], [27, 31, 28, 24], [28, 32, 33, 29], [29, 33, 34, 30], [30, 34, 35, 31], [31, 35, 32, 28], [32, 36, 37, 33], [33, 37, 38, 34], [34, 38, 39, 35], [35, 39, 36, 32], [36, 40, 41, 37], [37, 41, 42, 38], [38, 42, 43, 39], [39, 43, 40, 36], [40, 44, 45, 41], [41, 45, 46, 42], [42, 46, 47, 43], [43, 47, 44, 40], [44, 48, 49, 45], [45, 49, 50, 46], [46, 50, 51, 47], [47, 51, 48, 44], [48, 52, 53, 49], [49, 53, 54, 50], [50, 54, 55, 51], [51, 55, 52, 48], [52, 56, 57, 53], [53, 57, 58, 54], [54, 58, 59, 55], [55, 59, 56, 52], [56, 60, 61, 57], [57, 61, 62, 58], [58, 62, 63, 59], [59, 63, 60, 56], [60, 64, 65, 61], [61, 65, 66, 62], [62, 66, 67, 63], [63, 67, 64, 60], [64, 68, 69, 65], [65, 69, 70, 66], [66, 70, 71, 67], [67, 71, 68, 64], [68, 72, 73, 69], [69, 73, 74, 70], [70, 74, 75, 71], [71, 75, 72, 68], [72, 76, 77, 73], [73, 77, 78, 74], [74, 78, 79, 75], [75, 79, 76, 72], [76, 80, 81, 77], [77, 81, 82, 78], [78, 82, 83, 79], [79, 83, 80, 76], [80, 84, 85, 81], [81, 85, 86, 82], [82, 86, 87, 83], [83, 87, 84, 80], [84, 88, 89, 85], [85, 89, 90, 86], [86, 90, 91, 87], [87, 91, 88, 84], [88, 92, 93, 89], [89, 93, 94, 90], [90, 94, 95, 91], [91, 95, 92, 88], [92, 96, 97, 93], [93, 97, 98, 94], [94, 98, 99, 95], [95, 99, 96, 92], [96, 100, 101, 97], [97, 101, 102, 98], [98, 102, 103, 99], [99, 103, 100, 96], [100, 104, 105, 101], [101, 105, 106, 102], [102, 106, 107, 103], [103, 107, 104, 100], [104, 108, 109, 105], [105, 109, 110, 106], [106, 110, 111, 107], [107, 111, 108, 104], [108, 112, 113, 109], [109, 113, 114, 110], [110, 114, 115, 111], [111, 115, 112, 108], [112, 116, 117, 113], [113, 117, 118, 114], [114, 118, 119, 115], [115, 119, 116, 112], [116, 120, 121, 117], [117, 121, 122, 118], [118, 122, 123, 119], [119, 123, 120, 116], [120, 124, 125, 121], [121, 125, 126, 122], [122, 126, 127, 123], [123, 127, 124, 120], [124, 128, 129, 125], [125, 129, 130, 126], [126, 130, 131, 127], [127, 131, 128, 124], [128, 0, 1, 129], [129, 1, 2, 130], [130, 2, 3, 131], [131, 3, 0, 128]], convexity=10);
              }
            }
          }
        }
        // 'tap'
        multmatrix(m=[[1.0, 0.0, 0.0, 0.0], [0.0, -1.0, 0.0, 0.0], [0.0, 0.0, -1.0, -7.98], [0.0, 0.0, 0.0, 1.0]]) {
          // 'tap'
          multmatrix(m=[[1.0, 0.0, 0.0, 0.0], [-0.0, -1.0, -0.0, -0.0], [-0.0, -0.0, -1.0, 0.015], [0.0, 0.0, 0.0, 1.0]]) {
            // 'inner : _combine_solids_and_holes'
            union() {
              // 'pie : _combine_solids_and_holes'
              union() {
                // 'pie'
                polyhedron(points=[[0.0, 0.0, 0.0], [0.0, 0.0, 0.03], [1.335, 0.0, 0.03], [1.335, 0.0, 0.0], [0.0, 0.0, 0.0], [0.0, 0.0, 0.03], [1.3093483493383127, 0.2604455798915312, 0.03], [1.3093483493383127, 0.2604455798915312, 0.0], [0.0, 0.0, 0.0], [0.0, 0.0, 0.03], [1.2333791759025678, 0.5108823822073948, 0.03], [1.2333791759025678, 0.5108823822073948, 0.0], [0.0, 0.0, 0.0], [0.0, 0.0, 0.03], [1.110011932423898, 0.7416862610811689, 0.03], [1.110011932423898, 0.7416862610811689, 0.0], [0.0, 0.0, 0.0], [0.0, 0.0, 0.03], [0.943987552884041, 0.943987552884041, 0.03], [0.943987552884041, 0.943987552884041, 0.0], [0.0, 0.0, 0.0], [0.0, 0.0, 0.03], [0.7416862610811691, 1.110011932423898, 0.03], [0.7416862610811691, 1.110011932423898, 0.0], [0.0, 0.0, 0.0], [0.0, 0.0, 0.03], [0.5108823822073949, 1.2333791759025678, 0.03], [0.5108823822073949, 1.2333791759025678, 0.0], [0.0, 0.0, 0.0], [0.0, 0.0, 0.03], [0.26044557989153133, 1.3093483493383127, 0.03], [0.26044557989153133, 1.3093483493383127, 0.0], [0.0, 0.0, 0.0], [0.0, 0.0, 0.03], [0.0, 1.335, 0.03], [0.0, 1.335, 0.0], [0.0, 0.0, 0.0], [0.0, 0.0, 0.03], [-0.2604455798915311, 1.3093483493383127, 0.03], [-0.2604455798915311, 1.3093483493383127, 0.0], [0.0, 0.0, 0.0], [0.0, 0.0, 0.03], [-0.5108823822073948, 1.2333791759025678, 0.03], [-0.5108823822073948, 1.2333791759025678, 0.0], [0.0, 0.0, 0.0], [0.0, 0.0, 0.03], [-0.7416862610811686, 1.110011932423898, 0.03], [-0.7416862610811686, 1.110011932423898, 0.0], [0.0, 0.0, 0.0], [0.0, 0.0, 0.03], [-0.9439875528840408, 0.943987552884041, 0.03], [-0.9439875528840408, 0.943987552884041, 0.0], [0.0, 0.0, 0.0], [0.0, 0.0, 0.03], [-1.110011932423898, 0.7416862610811689, 0.03], [-1.110011932423898, 0.7416862610811689, 0.0], [0.0, 0.0, 0.0], [0.0, 0.0, 0.03], [-1.2333791759025678, 0.510882382207395, 0.03], [-1.2333791759025678, 0.510882382207395, 0.0], [0.0, 0.0, 0.0], [0.0, 0.0, 0.03], [-1.3093483493383127, 0.26044557989153166, 0.03], [-1.3093483493383127, 0.26044557989153166, 0.0], [0.0, 0.0, 0.0], [0.0, 0.0, 0.03], [-1.335, 0.0, 0.03], [-1.335, 0.0, 0.0], [0.0, 0.0, 0.0], [0.0, 0.0, 0.03], [-1.3093483493383127, -0.26044557989153133, 0.03], [-1.3093483493383127, -0.26044557989153133, 0.0], [0.0, 0.0, 0.0], [0.0, 0.0, 0.03], [-1.2333791759025678, -0.5108823822073947, 0.03], [-1.2333791759025678, -0.5108823822073947, 0.0], [0.0, 0.0, 0.0], [0.0, 0.0, 0.03], [-1.1100119324238982, -0.7416862610811686, 0.03], [-1.1100119324238982, -0.7416862610811686, 0.0], [0.0, 0.0, 0.0], [0.0, 0.0, 0.03], [-0.9439875528840411, -0.9439875528840408, 0.03], [-0.9439875528840411, -0.9439875528840408, 0.0], [0.0, 0.0, 0.0], [0.0, 0.0, 0.03], [-0.7416862610811689, -1.110011932423898, 0.03], [-0.7416862610811689, -1.110011932423898, 0.0], [0.0, 0.0, 0.0], [0.0, 0.0, 0.03], [-0.5108823822073956, -1.2333791759025674, 0.03], [-0.5108823822073956, -1.2333791759025674, 0.0], [0.0, 0.0, 0.0], [0.0, 0.0, 0.03], [-0.2604455798915318, -1.3093483493383125, 0.03], [-0.2604455798915318, -1.3093483493383125, 0.0], [0.0, 0.0, 0.0], [0.0, 0.0, 0.03], [0.0, -1.335, 0.03], [0.0, -1.335, 0.0], [0.0, 0.0, 0.0], [0.0, 0.0, 0.03], [0.2604455798915313, -1.3093483493383127, 0.03], [0.2604455798915313, -1.3093483493383127, 0.0], [0.0, 0.0, 0.0], [0.0, 0.0, 0.03], [0.5108823822073951, -1.2333791759025676, 0.03], [0.5108823822073951, -1.2333791759025676, 0.0], [0.0, 0.0, 0.0], [0.0, 0.0, 0.03], [0.7416862610811684, -1.1100119324238982, 0.03], [0.7416862610811684, -1.1100119324238982, 0.0], [0.0, 0.0, 0.0], [0.0, 0.0, 0.03], [0.9439875528840407, -0.9439875528840411, 0.03], [0.9439875528840407, -0.9439875528840411, 0.0], [0.0, 0.0, 0.0], [0.0, 0.0, 0.03], [1.110011932423898, -0.7416862610811689, 0.03], [1.110011932423898, -0.7416862610811689, 0.0], [0.0, 0.0, 0.0], [0.0, 0.0, 0.03], [1.2333791759025674, -0.5108823822073957, 0.03], [1.2333791759025674, -0.5108823822073957, 0.0], [0.0, 0.0, 0.0], [0.0, 0.0, 0.03], [1.3093483493383125, -0.26044557989153183, 0.03], [1.3093483493383125, -0.26044557989153183, 0.0], [0.0, 0.0, 0.0], [0.0, 0.0, 0.03], [1.335, 0.0, 0.03], [1.335, 0.0, 0.0]], faces=[[0, 4, 5, 1], [1, 5, 6, 2], [2, 6, 7, 3], [3, 7, 4, 0], [4, 8, 9, 5], [5, 9, 10, 6], [6, 10, 11, 7], [7, 11, 8, 4], [8, 12, 13, 9], [9, 13, 14, 10], [10, 14, 15, 11], [11, 15, 12, 8], [12, 16, 17, 13], [13, 17, 18, 14], [14, 18, 19, 15], [15, 19, 16, 12], [16, 20, 21, 17], [17, 21, 22, 18], [18, 22, 23, 19], [19, 23, 20, 16], [20, 24, 25, 21], [21, 25, 26, 22], [22, 26, 27, 23], [23, 27, 24, 20], [24, 28, 29, 25], [25, 29, 30, 26], [26, 30, 31, 27], [27, 31, 28, 24], [28, 32, 33, 29], [29, 33, 34, 30], [30, 34, 35, 31], [31, 35, 32, 28], [32, 36, 37, 33], [33, 37, 38, 34], [34, 38, 39, 35], [35, 39, 36, 32], [36, 40, 41, 37], [37, 41, 42, 38], [38, 42, 43, 39], [39, 43, 40, 36], [40, 44, 45, 41], [41, 45, 46, 42], [42, 46, 47, 43], [43, 47, 44, 40], [44, 48, 49, 45], [45, 49, 50, 46], [46, 50, 51, 47], [47, 51, 48, 44], [48, 52, 53, 49], [49, 53, 54, 50], [50, 54, 55, 51], [51, 55, 52, 48], [52, 56, 57, 53], [53, 57, 58, 54], [54, 58, 59, 55], [55, 59, 56, 52], [56, 60, 61, 57], [57, 61, 62, 58], [58, 62, 63, 59], [59, 63, 60, 56], [60, 64, 65, 61], [61, 65, 66, 62], [62, 66, 67, 63], [63, 67, 64, 60], [64, 68, 69, 65], [65, 69, 70, 66], [66, 70, 71, 67], [67, 71, 68, 64], [68, 72, 73, 69], [69, 73, 74, 70], [70, 74, 75, 71], [71, 75, 72, 68], [72, 76, 77, 73], [73, 77, 78, 74], [74, 78, 79, 75], [75, 79, 76, 72], [76, 80, 81, 77], [77, 81, 82, 78], [78, 82, 83, 79], [79, 83, 80, 76], [80, 84, 85, 81], [81, 85, 86, 82], [82, 86, 87, 83], [83, 87, 84, 80], [84, 88, 89, 85], [85, 89, 90, 86], [86, 90, 91, 87], [87, 91, 88, 84], [88, 92, 93, 89], [89, 93, 94, 90], [90, 94, 95, 91], [91, 95, 92, 88], [92, 96, 97, 93], [93, 97, 98, 94], [94, 98, 99, 95], [95, 99, 96, 92], [96, 100, 101, 97], [97, 101, 102, 98], [98, 102, 103, 99], [99, 103, 100, 96], [100, 104, 105, 101], [101, 105, 106, 102], [102, 106, 107, 103], [103, 107, 104, 100], [104, 108, 109, 105], [105, 109, 110, 106], [106, 110, 111, 107], [107, 111, 108, 104], [108, 112, 113, 109], [109, 113, 114, 110], [110, 114, 115, 111], [111, 115, 112, 108], [112, 116, 117, 113], [113, 117, 118, 114], [114, 118, 119, 115], [115, 119, 116, 112], [116, 120, 121, 117], [117, 121, 122, 118], [118, 122, 123, 119], [119, 123, 120, 116], [120, 124, 125, 121], [121, 125, 126, 122], [122, 126, 127, 123], [123, 127, 124, 120], [124, 128, 129, 125], [125, 129, 130, 126], [126, 130, 131, 127], [127, 131, 128, 124], [128, 0, 1, 129], [129, 1, 2, 130], [130, 2, 3, 131], [131, 3, 0, 128]], convexity=10);
              }
            }
          }
        }
        // 'access_hole'
        multmatrix(m=[[1.0, 0.0, 0.0, 0.0], [0.0, 1.0, 0.0, 0.0], [0.0, 0.0, 1.0, 1.0], [0.0, 0.0, 0.0, 1.0]]) {
          // 'access_hole'
          multmatrix(m=[[1.0, 0.0, 0.0, 0.0], [0.0, 1.0, 0.0, 0.0], [0.0, 0.0, 1.0, -1.5], [0.0, 0.0, 0.0, 1.0]]) {
            // 'access_hole : _combine_solids_and_holes'
            union() {
              // 'access_hole'
              cylinder(h=1.5, r1=2.955, r2=2.955, center=false, $fn=32);
            }
          }
          // 'access_hole'
          multmatrix(m=[[1.0, 0.0, 0.0, -4.440892098500626e-16], [0.0, 1.0, 0.0, 0.0], [0.0, 0.0, 1.0, -4.445], [0.0, 0.0, 0.0, 1.0]]) {
            // 'couter_sink_hole'
            color(c=[1.0, 0.0, 0.0, 1.0]) {
              // 'couter_sink_hole : _combine_solids_and_holes'
              union() {
                // 'couter_sink_hole'
                cylinder(h=2.955, r1=0.0, r2=2.955, center=false, $fn=32);
              }
            }
          }
        }
      }
    }
  }
} // end module default_5_default_5
